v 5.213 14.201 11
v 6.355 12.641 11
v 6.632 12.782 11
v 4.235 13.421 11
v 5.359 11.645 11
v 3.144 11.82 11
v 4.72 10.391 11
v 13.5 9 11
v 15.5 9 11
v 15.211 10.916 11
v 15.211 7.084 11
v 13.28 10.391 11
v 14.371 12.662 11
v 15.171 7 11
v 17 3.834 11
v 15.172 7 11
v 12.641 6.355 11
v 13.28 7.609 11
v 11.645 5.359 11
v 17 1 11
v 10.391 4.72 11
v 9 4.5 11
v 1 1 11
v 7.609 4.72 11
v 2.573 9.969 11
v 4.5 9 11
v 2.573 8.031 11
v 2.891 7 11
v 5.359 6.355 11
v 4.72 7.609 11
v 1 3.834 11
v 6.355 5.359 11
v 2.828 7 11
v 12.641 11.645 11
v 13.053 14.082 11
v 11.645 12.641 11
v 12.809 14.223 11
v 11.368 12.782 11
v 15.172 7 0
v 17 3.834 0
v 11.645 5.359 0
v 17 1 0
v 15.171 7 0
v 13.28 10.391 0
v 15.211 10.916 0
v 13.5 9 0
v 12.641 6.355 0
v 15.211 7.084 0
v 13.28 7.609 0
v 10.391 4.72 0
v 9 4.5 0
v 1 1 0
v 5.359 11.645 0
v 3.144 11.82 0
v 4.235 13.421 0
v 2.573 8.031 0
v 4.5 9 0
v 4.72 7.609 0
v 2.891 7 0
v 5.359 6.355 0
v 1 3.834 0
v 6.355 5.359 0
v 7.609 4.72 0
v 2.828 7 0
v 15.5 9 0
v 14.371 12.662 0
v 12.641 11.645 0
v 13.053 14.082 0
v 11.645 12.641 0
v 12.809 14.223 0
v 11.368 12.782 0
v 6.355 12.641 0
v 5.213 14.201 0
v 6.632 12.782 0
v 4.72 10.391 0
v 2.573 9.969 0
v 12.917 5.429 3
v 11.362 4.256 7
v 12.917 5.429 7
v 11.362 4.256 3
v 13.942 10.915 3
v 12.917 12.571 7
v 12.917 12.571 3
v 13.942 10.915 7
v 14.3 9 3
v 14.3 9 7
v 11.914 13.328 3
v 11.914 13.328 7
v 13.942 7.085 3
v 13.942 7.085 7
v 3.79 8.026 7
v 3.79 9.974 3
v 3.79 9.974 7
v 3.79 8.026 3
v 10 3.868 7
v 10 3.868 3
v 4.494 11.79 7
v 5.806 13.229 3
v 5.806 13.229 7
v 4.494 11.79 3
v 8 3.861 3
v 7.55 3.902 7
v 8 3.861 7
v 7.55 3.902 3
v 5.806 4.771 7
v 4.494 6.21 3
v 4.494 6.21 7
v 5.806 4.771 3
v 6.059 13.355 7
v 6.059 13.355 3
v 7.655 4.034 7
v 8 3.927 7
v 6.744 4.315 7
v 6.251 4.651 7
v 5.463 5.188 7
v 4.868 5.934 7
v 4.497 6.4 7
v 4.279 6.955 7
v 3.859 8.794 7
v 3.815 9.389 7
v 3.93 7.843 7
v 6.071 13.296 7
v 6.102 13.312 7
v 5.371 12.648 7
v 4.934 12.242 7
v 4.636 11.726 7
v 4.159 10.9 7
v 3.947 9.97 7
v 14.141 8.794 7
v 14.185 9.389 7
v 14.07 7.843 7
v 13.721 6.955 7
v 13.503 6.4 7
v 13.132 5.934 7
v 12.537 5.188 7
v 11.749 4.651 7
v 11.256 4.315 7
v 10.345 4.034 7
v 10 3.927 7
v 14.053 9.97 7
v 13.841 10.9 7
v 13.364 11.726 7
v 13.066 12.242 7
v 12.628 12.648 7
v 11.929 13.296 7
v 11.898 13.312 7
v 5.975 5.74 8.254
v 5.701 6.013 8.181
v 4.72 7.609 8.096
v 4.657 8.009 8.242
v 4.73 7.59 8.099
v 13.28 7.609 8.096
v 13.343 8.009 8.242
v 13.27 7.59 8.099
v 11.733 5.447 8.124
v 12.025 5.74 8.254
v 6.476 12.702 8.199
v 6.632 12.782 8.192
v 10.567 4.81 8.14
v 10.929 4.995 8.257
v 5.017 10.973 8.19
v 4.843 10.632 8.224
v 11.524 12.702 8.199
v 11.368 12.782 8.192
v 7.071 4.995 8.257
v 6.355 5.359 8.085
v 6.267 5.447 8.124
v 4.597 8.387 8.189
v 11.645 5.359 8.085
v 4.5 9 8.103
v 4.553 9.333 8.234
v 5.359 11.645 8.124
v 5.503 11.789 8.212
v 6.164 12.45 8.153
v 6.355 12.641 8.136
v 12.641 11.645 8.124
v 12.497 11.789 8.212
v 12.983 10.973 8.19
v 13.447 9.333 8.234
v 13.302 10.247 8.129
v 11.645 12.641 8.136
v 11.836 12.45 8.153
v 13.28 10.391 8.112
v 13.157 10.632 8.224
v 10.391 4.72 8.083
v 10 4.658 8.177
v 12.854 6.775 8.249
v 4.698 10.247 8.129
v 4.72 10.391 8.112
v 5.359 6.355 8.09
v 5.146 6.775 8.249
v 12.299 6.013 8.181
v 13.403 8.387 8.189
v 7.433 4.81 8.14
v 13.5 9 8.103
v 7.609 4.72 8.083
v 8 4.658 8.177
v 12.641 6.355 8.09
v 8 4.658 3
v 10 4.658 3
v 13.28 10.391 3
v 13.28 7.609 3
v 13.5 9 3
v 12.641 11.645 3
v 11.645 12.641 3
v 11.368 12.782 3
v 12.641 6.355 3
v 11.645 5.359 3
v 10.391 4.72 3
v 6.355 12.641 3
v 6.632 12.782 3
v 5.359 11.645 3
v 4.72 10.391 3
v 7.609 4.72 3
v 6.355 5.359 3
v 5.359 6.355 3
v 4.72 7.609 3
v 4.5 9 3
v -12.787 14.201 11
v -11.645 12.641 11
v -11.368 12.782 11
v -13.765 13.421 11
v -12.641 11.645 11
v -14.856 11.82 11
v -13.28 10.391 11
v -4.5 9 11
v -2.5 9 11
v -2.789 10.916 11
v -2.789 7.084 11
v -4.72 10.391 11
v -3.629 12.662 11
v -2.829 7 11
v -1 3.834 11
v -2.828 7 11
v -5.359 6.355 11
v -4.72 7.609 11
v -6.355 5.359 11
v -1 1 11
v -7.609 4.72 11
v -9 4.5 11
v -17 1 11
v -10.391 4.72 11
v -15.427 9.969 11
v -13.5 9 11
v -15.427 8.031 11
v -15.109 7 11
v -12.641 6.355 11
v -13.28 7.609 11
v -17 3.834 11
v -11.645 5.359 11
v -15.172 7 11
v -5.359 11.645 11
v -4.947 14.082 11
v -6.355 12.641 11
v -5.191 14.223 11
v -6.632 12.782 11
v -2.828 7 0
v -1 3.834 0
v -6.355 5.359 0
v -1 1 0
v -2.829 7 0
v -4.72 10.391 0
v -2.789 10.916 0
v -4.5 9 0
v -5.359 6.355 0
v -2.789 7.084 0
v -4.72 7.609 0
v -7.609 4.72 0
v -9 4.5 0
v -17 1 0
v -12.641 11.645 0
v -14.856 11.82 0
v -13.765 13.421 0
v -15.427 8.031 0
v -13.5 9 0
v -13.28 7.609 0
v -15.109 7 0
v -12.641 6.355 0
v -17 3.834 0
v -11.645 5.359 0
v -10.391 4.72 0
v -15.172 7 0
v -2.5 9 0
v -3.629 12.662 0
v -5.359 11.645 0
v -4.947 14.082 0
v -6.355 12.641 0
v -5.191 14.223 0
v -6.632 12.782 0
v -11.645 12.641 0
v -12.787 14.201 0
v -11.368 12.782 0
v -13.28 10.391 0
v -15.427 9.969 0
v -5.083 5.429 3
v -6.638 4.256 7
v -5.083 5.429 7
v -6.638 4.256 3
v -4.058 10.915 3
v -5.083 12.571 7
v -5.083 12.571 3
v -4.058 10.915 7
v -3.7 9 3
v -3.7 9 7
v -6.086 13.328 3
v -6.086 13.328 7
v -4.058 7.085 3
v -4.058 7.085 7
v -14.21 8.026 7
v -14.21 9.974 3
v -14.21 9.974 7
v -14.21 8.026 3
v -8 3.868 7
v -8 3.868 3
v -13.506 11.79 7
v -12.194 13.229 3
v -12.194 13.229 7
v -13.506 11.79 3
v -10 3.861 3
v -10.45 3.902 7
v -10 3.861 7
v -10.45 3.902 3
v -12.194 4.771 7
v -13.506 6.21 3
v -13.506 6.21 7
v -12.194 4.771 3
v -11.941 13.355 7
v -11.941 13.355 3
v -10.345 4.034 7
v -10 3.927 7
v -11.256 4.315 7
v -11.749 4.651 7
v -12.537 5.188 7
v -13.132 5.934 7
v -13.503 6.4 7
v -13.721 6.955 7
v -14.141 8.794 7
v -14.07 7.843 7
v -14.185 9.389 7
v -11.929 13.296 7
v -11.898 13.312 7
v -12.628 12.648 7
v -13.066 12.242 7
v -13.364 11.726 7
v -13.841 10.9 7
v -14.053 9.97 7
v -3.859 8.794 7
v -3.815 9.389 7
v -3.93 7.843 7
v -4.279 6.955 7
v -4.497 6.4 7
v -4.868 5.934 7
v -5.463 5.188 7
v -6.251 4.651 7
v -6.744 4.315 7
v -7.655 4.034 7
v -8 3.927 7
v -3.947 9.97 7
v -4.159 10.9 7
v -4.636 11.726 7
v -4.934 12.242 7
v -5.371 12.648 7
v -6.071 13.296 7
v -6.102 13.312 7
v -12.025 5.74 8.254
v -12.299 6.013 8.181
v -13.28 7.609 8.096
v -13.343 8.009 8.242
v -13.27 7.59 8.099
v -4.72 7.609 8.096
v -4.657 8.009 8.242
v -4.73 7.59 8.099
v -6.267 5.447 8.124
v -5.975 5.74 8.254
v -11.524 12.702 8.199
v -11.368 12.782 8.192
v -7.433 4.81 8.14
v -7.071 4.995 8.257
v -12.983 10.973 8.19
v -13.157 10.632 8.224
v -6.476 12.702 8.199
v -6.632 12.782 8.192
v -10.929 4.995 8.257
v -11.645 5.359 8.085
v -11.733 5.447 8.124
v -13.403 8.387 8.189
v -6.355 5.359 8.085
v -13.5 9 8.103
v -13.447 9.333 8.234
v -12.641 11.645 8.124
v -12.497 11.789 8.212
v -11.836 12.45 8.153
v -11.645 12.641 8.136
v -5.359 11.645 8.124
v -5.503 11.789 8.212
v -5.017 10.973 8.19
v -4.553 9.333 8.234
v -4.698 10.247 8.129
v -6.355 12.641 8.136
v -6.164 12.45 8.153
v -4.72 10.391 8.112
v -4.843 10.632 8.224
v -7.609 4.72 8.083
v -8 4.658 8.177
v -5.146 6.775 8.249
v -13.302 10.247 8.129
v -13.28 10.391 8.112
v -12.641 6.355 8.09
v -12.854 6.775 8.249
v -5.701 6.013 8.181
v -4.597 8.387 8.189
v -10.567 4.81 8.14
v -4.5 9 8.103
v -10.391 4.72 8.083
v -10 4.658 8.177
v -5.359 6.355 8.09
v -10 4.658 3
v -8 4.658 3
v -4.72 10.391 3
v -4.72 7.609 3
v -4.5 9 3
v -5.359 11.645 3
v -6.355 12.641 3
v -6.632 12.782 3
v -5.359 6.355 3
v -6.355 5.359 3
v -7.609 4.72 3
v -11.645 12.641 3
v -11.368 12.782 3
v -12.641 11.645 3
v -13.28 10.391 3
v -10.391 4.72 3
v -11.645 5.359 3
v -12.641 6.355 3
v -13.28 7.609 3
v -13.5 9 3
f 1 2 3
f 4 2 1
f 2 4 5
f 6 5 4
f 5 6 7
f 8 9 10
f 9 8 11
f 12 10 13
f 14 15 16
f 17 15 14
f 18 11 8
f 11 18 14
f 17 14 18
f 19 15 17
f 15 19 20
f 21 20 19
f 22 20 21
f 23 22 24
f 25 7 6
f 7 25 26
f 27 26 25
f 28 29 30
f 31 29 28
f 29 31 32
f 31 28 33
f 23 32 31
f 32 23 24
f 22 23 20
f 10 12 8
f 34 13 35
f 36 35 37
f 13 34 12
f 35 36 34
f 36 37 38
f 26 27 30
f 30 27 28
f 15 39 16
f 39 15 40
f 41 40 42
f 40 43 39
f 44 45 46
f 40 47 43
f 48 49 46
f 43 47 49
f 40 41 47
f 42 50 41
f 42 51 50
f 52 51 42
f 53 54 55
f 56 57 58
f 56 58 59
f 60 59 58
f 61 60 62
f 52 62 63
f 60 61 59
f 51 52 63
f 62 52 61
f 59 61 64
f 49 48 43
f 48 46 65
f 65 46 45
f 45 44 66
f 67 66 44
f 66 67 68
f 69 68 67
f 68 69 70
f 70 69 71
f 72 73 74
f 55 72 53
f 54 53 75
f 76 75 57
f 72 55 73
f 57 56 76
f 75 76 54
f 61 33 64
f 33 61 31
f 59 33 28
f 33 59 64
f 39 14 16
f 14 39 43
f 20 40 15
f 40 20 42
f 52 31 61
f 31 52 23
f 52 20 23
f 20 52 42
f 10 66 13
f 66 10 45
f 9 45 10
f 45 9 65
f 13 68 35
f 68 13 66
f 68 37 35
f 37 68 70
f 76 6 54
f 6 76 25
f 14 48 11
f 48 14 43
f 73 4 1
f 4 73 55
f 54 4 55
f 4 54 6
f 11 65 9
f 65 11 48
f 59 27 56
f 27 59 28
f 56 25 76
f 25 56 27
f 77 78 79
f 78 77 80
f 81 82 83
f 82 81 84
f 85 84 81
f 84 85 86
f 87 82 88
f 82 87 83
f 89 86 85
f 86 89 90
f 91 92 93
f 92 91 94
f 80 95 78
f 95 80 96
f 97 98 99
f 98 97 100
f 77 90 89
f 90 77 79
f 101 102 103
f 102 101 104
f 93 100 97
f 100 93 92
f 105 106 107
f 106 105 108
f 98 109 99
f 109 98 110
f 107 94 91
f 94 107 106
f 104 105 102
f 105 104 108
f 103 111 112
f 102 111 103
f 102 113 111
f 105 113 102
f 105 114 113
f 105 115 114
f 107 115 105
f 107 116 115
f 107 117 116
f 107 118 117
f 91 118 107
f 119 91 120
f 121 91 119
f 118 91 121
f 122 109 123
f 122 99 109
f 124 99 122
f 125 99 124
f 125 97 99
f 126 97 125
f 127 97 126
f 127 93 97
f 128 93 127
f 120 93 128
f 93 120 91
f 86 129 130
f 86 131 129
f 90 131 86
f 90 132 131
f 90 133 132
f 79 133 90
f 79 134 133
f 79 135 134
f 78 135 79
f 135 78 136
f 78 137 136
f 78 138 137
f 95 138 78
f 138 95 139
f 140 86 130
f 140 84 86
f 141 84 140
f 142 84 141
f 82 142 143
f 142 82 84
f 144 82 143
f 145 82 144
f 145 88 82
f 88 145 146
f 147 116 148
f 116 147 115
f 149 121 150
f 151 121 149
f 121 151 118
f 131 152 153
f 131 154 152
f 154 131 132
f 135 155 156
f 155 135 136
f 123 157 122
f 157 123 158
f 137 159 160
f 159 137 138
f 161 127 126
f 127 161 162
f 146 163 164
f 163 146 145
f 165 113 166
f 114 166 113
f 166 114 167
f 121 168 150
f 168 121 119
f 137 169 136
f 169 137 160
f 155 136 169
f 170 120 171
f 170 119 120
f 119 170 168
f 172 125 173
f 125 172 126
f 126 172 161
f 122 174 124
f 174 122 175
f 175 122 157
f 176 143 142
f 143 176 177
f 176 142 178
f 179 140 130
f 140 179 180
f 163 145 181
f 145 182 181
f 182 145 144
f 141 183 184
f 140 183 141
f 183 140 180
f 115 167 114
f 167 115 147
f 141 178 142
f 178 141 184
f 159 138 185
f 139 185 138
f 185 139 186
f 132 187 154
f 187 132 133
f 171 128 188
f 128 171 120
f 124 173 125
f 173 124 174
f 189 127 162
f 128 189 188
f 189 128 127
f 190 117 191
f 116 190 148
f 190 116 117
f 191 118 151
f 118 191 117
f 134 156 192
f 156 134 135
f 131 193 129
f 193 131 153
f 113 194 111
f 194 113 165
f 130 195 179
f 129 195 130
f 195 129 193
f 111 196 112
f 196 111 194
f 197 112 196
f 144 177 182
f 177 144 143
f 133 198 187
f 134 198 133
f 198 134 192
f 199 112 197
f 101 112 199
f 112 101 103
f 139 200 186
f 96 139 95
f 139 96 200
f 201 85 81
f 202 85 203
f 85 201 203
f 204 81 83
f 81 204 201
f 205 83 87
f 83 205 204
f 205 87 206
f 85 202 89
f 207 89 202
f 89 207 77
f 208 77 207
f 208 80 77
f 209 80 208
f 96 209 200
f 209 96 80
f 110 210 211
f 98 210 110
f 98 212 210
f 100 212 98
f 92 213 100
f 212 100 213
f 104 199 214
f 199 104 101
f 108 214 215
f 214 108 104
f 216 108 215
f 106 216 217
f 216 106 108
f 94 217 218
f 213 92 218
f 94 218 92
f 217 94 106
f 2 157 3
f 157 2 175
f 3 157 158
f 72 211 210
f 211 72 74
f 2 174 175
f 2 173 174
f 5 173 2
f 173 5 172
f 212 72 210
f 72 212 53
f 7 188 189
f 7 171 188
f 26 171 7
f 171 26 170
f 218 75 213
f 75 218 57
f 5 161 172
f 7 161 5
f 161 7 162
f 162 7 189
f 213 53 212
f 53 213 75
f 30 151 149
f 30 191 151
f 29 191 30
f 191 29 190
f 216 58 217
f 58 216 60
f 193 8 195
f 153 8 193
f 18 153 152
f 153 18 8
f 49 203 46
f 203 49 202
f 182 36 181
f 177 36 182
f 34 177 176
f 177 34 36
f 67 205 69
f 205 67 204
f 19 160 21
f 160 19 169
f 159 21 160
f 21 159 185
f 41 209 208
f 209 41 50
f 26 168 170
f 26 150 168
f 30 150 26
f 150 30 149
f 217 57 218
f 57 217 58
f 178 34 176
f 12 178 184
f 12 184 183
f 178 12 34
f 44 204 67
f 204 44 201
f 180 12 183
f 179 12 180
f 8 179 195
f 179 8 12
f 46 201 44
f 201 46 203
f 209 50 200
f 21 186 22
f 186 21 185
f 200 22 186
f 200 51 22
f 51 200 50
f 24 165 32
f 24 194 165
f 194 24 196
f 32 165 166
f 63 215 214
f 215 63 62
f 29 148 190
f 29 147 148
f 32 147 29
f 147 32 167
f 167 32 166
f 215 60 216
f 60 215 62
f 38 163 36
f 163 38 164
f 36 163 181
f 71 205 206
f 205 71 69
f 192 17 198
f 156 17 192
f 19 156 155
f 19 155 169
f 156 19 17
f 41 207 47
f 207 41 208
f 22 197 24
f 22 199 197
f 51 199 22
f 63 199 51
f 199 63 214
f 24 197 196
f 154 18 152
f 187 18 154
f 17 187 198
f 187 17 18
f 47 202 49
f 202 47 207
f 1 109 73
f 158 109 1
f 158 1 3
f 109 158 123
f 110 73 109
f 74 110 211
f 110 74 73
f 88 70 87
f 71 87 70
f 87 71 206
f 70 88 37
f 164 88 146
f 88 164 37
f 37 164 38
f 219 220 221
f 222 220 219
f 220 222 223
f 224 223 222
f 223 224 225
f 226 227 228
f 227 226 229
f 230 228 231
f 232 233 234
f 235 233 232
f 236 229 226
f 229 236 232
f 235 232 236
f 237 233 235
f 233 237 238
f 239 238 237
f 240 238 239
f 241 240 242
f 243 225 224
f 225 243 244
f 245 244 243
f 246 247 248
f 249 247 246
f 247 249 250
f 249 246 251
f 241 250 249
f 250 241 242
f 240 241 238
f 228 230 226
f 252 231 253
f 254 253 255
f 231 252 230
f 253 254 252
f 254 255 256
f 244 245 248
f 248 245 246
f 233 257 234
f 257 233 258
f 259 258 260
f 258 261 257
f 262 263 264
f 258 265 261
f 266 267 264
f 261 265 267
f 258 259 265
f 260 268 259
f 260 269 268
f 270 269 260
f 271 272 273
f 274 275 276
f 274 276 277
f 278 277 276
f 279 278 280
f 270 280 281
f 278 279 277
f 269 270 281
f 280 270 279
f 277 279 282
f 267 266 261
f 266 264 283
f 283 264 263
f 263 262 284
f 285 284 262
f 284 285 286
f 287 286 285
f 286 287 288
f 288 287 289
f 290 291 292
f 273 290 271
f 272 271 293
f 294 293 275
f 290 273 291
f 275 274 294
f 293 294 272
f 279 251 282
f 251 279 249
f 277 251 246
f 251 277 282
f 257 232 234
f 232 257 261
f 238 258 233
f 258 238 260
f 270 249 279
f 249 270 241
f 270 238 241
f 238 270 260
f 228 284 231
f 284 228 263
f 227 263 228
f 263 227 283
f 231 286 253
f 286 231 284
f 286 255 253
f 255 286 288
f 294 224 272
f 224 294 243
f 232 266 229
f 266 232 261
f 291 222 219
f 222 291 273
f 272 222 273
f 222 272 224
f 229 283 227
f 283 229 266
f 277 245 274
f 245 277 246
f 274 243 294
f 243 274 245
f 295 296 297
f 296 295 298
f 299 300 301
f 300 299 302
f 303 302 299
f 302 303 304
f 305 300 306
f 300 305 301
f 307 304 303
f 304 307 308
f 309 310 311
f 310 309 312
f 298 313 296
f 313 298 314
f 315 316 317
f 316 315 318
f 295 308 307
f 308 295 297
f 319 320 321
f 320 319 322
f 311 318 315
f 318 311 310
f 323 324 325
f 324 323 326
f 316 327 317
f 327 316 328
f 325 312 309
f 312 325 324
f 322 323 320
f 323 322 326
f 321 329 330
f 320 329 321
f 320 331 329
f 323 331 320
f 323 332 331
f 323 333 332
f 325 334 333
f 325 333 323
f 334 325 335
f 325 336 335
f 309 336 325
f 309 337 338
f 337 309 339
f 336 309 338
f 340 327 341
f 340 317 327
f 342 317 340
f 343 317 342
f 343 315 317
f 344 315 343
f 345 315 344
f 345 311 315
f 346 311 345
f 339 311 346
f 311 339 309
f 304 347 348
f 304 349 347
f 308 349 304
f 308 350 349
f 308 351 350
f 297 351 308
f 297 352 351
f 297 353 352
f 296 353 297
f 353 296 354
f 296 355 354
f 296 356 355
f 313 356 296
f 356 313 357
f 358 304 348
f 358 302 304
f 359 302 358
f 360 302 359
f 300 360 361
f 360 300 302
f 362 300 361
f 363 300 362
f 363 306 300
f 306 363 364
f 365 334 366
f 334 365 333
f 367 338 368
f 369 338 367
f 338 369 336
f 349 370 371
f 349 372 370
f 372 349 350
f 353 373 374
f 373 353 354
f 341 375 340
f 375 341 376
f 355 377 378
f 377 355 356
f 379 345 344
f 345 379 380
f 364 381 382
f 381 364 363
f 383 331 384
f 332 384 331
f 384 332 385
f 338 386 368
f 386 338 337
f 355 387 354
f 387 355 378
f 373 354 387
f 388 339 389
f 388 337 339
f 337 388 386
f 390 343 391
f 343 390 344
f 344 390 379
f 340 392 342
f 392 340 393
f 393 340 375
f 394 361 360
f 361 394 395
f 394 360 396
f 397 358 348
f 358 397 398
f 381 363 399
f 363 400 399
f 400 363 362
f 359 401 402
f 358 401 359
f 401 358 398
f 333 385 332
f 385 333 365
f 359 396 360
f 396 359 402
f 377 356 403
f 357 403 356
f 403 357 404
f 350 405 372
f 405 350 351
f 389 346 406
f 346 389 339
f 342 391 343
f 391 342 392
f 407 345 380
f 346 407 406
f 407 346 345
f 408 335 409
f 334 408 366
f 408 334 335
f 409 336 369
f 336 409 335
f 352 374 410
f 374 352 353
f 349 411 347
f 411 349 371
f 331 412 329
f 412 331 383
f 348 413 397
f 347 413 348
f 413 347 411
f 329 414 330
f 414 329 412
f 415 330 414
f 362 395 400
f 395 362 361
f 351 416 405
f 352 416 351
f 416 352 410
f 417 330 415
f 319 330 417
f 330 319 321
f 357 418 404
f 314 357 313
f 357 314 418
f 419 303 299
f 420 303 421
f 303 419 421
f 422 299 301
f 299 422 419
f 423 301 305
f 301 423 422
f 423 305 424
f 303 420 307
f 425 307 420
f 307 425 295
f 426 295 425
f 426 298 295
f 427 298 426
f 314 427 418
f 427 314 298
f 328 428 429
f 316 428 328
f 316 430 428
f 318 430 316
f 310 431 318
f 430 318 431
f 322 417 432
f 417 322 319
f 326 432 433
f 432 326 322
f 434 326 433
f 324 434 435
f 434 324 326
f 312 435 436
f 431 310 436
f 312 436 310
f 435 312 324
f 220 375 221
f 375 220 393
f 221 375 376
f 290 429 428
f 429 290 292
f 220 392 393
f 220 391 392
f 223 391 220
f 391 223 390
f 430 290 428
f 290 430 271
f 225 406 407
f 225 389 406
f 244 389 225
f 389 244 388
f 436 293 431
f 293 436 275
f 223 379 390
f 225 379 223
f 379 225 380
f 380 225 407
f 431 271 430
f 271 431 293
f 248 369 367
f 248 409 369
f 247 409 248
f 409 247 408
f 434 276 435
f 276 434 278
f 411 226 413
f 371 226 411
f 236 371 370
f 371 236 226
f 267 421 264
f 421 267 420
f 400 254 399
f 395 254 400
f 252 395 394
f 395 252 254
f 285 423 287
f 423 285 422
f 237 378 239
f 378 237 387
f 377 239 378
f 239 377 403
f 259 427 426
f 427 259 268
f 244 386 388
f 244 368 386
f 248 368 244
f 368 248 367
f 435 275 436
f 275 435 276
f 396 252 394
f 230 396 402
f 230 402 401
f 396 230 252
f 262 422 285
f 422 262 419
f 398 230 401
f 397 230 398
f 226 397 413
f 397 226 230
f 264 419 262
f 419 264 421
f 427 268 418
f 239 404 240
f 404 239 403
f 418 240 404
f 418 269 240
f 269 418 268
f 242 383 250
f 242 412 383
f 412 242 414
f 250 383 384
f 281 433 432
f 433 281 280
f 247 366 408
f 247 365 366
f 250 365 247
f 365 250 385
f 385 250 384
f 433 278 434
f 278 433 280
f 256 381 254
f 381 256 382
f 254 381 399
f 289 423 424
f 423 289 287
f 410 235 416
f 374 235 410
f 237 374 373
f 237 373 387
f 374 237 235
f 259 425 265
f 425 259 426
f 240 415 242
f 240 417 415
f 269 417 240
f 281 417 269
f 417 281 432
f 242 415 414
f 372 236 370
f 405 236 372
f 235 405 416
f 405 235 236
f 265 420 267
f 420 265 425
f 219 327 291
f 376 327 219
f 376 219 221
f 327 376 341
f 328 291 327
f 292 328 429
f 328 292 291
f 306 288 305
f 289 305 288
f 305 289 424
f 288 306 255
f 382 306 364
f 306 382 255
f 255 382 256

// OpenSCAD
// file: configuration.scad
// PRUSA Mendel  
// Configuration file
// GNU GPL v2
// Josef Průša
// josefprusa@me.com
// prusadjs.cz
// http://www.reprap.org/wiki/Prusa_Mendel
// http://github.com/prusajr/PrusaMendel

// PLEASE SELECT ONE OF THE CONFIGURATIONS BELOW
// BY UN-COMMENTING IT

variant=0; //0 for metric
//variant=1; //1 for SAE
if(variant==0){
echo("variant: metric");
}else if(variant==1){
echo("variant: sae");
} else{
echo("WARNING: INVALID CONFIGURATION");
}


vars=[
//[m8_dia, m8_nut, m4_dia, m4_nut, m3_dia, m3_nut, bush_dia, mot_shaft, bush_rod, bush_outerdia, bush_length]
[8.3,16.4,4.3,9,3.3,7,11,5.3,8,16,11],//metric
[9,15.7,5.5,10.6,5.5,10.6,11.5,5.3,7.9375,16,11]//SAE
];

//BUSHING TYPE Can generate three versions
// 1 - regular old ones
// 2 - helical ones
// 3 - holders for brass or any other bought bushings
bushing_type = 2;

//Round corner diameter
round_corner_diameter = 8;

//X end parameters
axis_diameter_real = 4;
axis_diameter_larger = 4.2 ;
pressure_pad_height = 0.7;

//Thin wall size
layer_height = 0.4;
perimeter_width_over_thicknes = 1.6;
infill_widht_over_thickness = 1.55;
thin_wall = 2*(perimeter_width_over_thicknes*layer_height+infill_widht_over_thickness*layer_height);
if(thin_wall<2){
	echo("Check thin wall size, its below 2mm!");
}
echo(thin_wall);

//DO NOT TOUCH THIS SECTION!
m8_diameter = vars[variant][0];
m8_nut_diameter = vars[variant][1];
m4_diameter = vars[variant][2];
m4_nut_diameter = vars[variant][3];
m3_diameter = vars[variant][4];
m3_nut_diameter = vars[variant][5];
bushing_diameter = vars[variant][6];
motor_shaft=vars[variant][7];
bushing_rodsize = vars[variant][8];
bushing_outerDiameter = vars[variant][9];
bushing_lenght = vars[variant][10];


// MINI-HUXLEY VERSION (TODO, just place holder)
// include <configuration-huxley.scad>

// MEGA VERSION (TODO, just place holder)
// include <configuration-mega.scad>


// Some basic functions, probably should be somewhere else
module roundcorner(diameter){
	difference(){
		cube(size = [diameter,diameter,99], center = false);
		translate(v = [diameter, diameter, 0]) cylinder(h = 100, r=diameter, center=true);
	}
}
module polyhole(h, d) {
    n = max(round(2 * d),3);
    rotate([0,0,180])
        cylinder(h = h, r = (d / 2) / cos (180 / n), $fn = n);
}
// main file
// PRUSA Mendel  
// Bushings
// GNU GPL v2
// Josef Průša
// josefprusa@me.com
// prusadjs.cz
// http://www.reprap.org/wiki/Prusa_Mendel
// http://github.com/prusajr/PrusaMendel

// Print them in PLA and glue them to place
// if they are too tight, define bigger rodsize
// or you can try to sand a bt off


// TYPE Can generate three versions
// 1 - regular old ones
// 2 - helical ones
// 3 - holders for brass or any other bought bushings


include <configuration.scad>

rodsize = bushing_rodsize;
outerDiameter = bushing_outerDiameter;
innerDiameter = 10.6;
length = bushing_lenght;
//type = bushing_type;
type=4;


module bushing_core_straight(){
union(){
	rotate(a=[0,0,45])
	difference(){
		union(){
			//outer ring
			difference(){
				union(){
					cylinder(h = length, r=outerDiameter/2); //1mm lemování
					//cylinder(h = 1, r=outerDiameter/2+2);
				}
				translate(v=[0,0,-1]) cylinder(h = length+2, r=(outerDiameter/2)-2);
			}

			//nipples inside touching the rod
			difference(){
				union(){
					translate(v=[0,0,length/2]) cube(size = [outerDiameter-1,2,length], center = true);
					translate(v=[0,0,length/2]) cube(size = [2,outerDiameter-1,length], center = true);
				}
				translate(v=[0,0,-1]) cylinder(h = length+2, r=rodsize/2, $fn=20);
			}
		}
		//opening cutout
		translate(v=[(outerDiameter/2)+1,(outerDiameter/2)+1,(length)/2]) cube(size = [outerDiameter,outerDiameter,length+2], center = true);
		
		}
	}
}
module bushing_core_holder(){
union(){
	rotate(a=[0,0,45])
	difference(){
		union(){
			//outer ring
			difference(){
				union(){
					cylinder(h = length, r=outerDiameter/2); //1mm lemování
					//cylinder(h = 1, r=outerDiameter/2+2);
				}
				translate(v=[0,0,-1]) cylinder(h = length+2, r=(rodsize/2));
			}
		}
		//opening cutout
		translate(v=[(outerDiameter/2)+1,(outerDiameter/2)+1,(length)/2]) cube(size = [outerDiameter,outerDiameter,length+2], center = true);
		
		}
	}
}

module bushing_core_helical(){
	difference(){
		rotate(a=[0,0,44]) translate(v=[0,0,(length)/2]) linear_extrude(center = true, height = length, twist = 90,convexity = 20) projection(cut = true) bushing_core_straight();
		translate(v=[0,-2.3,0]) rotate(a=[0,0,45]) translate(v=[(outerDiameter/2)+1,(outerDiameter/2)+1,(length)/2]) cube(size = [outerDiameter,outerDiameter,length+2], center = true);
		// hack for easier cleanup
		translate(v=[0,0,-0.5]) cylinder(h = 1, r=rodsize/2+1, $fn=20);
	}
}

module bushing(){
	difference(){
		translate(v=[0,-outerDiameter/4,length/2]) cube(size = [outerDiameter, outerDiameter/2,length], center = true);
		translate(v=[0,0,-1]) cylinder(h = length+2, r=outerDiameter/2-2);//
		if(type == 4){
			translate([0,0,length/2]) cube([outerDiameter, 4,length], center=true);
			for(i=[1,-1])
			{
				translate([i*outerDiameter*0.66,0,length/2]) rotate([0,0,i*30]) cube([outerDiameter*0.6,outerDiameter*0.8,length], center=true);
			}
		}

	}
	if(type == 1){
		bushing_core_straight();
	}
	if(type == 2){
		bushing_core_helical();
	}
	if(type == 3){
		bushing_core_holder();
	}
	if(type == 4){
		bushing_core_ptfe();
	}
}
module bushing_core_ptfe(){
union(){
	difference(){
		union(){
			//outer ring
			difference(){
				union(){
					cylinder(h = length, r=outerDiameter/2-1.5); //1mm lemování
					//cylinder(h = 1, r=outerDiameter/2+2);
				}
				translate(v=[0,0,-1]) cylinder(h = length+2, r=innerDiameter/2);
			}

			//nipples inside touching the rod
			rotate([0,0,90])
			difference(){
				union(){
					translate(v=[0,0,length/2]) cube(size = [outerDiameter-1,2,length], center = true);
					//translate(v=[0,0,length/2]) cube(size = [2,outerDiameter-1,length], center = true);
					translate([0,0,0]) cylinder(h=3,r=outerDiameter/2-1.6);
					difference()
					{
						translate([0,0,length-4]) cylinder(h=4,r=outerDiameter/2-1.6);
						translate([0,0,length-6]) cylinder(h=4,r1=outerDiameter/2-1.6,r2=outerDiameter/2-4);
					}
				}
				translate(v=[0,0,-1]) cylinder(h = length+2, r=rodsize/2+0.5, $fn=20);
			}
		}
		//opening cutout
		rotate([0,0,45])
		translate(v=[(outerDiameter/2)+1,(outerDiameter/2)+1,(length)/2]) cube(size = [outerDiameter,outerDiameter,length+2], center = true);
		
		}
	}
}
union(){
translate(v=[(rodsize+1),(rodsize+1),0]) bushing();
translate(v=[-(rodsize+1),(rodsize+1),0]) bushing();
//translate(v=[(rodsize+1),-(rodsize+1),0]) mirror([ 0, 1, 0 ]) bushing();
//translate(v=[-(rodsize+1),-(rodsize+1),0]) mirror([ 0, 1, 0 ]) bushing();
//translate(v=[3*(rodsize+1),(rodsize+1),0]) bushing();
//translate(v=[-3*(rodsize+1),(rodsize+1),0]) bushing();
//translate(v=[3*(rodsize+1),-(rodsize+1),0]) mirror([ 0, 1, 0 ]) bushing();
//translate(v=[-3*(rodsize+1),-(rodsize+1),0]) mirror([ 0, 1, 0 ]) bushing();
//translate(v=[(rodsize+1),3*(rodsize+1),0]) bushing();
//translate(v=[-(rodsize+1),3*(rodsize+1),0]) bushing();
//translate(v=[(rodsize+1),-3*(rodsize+1),0]) mirror([ 0, 1, 0 ]) bushing();
//translate(v=[-(rodsize+1),-3*(rodsize+1),0]) mirror([ 0, 1, 0 ]) bushing();
}
%cube([100,100,0.01],true);

//bushing();
